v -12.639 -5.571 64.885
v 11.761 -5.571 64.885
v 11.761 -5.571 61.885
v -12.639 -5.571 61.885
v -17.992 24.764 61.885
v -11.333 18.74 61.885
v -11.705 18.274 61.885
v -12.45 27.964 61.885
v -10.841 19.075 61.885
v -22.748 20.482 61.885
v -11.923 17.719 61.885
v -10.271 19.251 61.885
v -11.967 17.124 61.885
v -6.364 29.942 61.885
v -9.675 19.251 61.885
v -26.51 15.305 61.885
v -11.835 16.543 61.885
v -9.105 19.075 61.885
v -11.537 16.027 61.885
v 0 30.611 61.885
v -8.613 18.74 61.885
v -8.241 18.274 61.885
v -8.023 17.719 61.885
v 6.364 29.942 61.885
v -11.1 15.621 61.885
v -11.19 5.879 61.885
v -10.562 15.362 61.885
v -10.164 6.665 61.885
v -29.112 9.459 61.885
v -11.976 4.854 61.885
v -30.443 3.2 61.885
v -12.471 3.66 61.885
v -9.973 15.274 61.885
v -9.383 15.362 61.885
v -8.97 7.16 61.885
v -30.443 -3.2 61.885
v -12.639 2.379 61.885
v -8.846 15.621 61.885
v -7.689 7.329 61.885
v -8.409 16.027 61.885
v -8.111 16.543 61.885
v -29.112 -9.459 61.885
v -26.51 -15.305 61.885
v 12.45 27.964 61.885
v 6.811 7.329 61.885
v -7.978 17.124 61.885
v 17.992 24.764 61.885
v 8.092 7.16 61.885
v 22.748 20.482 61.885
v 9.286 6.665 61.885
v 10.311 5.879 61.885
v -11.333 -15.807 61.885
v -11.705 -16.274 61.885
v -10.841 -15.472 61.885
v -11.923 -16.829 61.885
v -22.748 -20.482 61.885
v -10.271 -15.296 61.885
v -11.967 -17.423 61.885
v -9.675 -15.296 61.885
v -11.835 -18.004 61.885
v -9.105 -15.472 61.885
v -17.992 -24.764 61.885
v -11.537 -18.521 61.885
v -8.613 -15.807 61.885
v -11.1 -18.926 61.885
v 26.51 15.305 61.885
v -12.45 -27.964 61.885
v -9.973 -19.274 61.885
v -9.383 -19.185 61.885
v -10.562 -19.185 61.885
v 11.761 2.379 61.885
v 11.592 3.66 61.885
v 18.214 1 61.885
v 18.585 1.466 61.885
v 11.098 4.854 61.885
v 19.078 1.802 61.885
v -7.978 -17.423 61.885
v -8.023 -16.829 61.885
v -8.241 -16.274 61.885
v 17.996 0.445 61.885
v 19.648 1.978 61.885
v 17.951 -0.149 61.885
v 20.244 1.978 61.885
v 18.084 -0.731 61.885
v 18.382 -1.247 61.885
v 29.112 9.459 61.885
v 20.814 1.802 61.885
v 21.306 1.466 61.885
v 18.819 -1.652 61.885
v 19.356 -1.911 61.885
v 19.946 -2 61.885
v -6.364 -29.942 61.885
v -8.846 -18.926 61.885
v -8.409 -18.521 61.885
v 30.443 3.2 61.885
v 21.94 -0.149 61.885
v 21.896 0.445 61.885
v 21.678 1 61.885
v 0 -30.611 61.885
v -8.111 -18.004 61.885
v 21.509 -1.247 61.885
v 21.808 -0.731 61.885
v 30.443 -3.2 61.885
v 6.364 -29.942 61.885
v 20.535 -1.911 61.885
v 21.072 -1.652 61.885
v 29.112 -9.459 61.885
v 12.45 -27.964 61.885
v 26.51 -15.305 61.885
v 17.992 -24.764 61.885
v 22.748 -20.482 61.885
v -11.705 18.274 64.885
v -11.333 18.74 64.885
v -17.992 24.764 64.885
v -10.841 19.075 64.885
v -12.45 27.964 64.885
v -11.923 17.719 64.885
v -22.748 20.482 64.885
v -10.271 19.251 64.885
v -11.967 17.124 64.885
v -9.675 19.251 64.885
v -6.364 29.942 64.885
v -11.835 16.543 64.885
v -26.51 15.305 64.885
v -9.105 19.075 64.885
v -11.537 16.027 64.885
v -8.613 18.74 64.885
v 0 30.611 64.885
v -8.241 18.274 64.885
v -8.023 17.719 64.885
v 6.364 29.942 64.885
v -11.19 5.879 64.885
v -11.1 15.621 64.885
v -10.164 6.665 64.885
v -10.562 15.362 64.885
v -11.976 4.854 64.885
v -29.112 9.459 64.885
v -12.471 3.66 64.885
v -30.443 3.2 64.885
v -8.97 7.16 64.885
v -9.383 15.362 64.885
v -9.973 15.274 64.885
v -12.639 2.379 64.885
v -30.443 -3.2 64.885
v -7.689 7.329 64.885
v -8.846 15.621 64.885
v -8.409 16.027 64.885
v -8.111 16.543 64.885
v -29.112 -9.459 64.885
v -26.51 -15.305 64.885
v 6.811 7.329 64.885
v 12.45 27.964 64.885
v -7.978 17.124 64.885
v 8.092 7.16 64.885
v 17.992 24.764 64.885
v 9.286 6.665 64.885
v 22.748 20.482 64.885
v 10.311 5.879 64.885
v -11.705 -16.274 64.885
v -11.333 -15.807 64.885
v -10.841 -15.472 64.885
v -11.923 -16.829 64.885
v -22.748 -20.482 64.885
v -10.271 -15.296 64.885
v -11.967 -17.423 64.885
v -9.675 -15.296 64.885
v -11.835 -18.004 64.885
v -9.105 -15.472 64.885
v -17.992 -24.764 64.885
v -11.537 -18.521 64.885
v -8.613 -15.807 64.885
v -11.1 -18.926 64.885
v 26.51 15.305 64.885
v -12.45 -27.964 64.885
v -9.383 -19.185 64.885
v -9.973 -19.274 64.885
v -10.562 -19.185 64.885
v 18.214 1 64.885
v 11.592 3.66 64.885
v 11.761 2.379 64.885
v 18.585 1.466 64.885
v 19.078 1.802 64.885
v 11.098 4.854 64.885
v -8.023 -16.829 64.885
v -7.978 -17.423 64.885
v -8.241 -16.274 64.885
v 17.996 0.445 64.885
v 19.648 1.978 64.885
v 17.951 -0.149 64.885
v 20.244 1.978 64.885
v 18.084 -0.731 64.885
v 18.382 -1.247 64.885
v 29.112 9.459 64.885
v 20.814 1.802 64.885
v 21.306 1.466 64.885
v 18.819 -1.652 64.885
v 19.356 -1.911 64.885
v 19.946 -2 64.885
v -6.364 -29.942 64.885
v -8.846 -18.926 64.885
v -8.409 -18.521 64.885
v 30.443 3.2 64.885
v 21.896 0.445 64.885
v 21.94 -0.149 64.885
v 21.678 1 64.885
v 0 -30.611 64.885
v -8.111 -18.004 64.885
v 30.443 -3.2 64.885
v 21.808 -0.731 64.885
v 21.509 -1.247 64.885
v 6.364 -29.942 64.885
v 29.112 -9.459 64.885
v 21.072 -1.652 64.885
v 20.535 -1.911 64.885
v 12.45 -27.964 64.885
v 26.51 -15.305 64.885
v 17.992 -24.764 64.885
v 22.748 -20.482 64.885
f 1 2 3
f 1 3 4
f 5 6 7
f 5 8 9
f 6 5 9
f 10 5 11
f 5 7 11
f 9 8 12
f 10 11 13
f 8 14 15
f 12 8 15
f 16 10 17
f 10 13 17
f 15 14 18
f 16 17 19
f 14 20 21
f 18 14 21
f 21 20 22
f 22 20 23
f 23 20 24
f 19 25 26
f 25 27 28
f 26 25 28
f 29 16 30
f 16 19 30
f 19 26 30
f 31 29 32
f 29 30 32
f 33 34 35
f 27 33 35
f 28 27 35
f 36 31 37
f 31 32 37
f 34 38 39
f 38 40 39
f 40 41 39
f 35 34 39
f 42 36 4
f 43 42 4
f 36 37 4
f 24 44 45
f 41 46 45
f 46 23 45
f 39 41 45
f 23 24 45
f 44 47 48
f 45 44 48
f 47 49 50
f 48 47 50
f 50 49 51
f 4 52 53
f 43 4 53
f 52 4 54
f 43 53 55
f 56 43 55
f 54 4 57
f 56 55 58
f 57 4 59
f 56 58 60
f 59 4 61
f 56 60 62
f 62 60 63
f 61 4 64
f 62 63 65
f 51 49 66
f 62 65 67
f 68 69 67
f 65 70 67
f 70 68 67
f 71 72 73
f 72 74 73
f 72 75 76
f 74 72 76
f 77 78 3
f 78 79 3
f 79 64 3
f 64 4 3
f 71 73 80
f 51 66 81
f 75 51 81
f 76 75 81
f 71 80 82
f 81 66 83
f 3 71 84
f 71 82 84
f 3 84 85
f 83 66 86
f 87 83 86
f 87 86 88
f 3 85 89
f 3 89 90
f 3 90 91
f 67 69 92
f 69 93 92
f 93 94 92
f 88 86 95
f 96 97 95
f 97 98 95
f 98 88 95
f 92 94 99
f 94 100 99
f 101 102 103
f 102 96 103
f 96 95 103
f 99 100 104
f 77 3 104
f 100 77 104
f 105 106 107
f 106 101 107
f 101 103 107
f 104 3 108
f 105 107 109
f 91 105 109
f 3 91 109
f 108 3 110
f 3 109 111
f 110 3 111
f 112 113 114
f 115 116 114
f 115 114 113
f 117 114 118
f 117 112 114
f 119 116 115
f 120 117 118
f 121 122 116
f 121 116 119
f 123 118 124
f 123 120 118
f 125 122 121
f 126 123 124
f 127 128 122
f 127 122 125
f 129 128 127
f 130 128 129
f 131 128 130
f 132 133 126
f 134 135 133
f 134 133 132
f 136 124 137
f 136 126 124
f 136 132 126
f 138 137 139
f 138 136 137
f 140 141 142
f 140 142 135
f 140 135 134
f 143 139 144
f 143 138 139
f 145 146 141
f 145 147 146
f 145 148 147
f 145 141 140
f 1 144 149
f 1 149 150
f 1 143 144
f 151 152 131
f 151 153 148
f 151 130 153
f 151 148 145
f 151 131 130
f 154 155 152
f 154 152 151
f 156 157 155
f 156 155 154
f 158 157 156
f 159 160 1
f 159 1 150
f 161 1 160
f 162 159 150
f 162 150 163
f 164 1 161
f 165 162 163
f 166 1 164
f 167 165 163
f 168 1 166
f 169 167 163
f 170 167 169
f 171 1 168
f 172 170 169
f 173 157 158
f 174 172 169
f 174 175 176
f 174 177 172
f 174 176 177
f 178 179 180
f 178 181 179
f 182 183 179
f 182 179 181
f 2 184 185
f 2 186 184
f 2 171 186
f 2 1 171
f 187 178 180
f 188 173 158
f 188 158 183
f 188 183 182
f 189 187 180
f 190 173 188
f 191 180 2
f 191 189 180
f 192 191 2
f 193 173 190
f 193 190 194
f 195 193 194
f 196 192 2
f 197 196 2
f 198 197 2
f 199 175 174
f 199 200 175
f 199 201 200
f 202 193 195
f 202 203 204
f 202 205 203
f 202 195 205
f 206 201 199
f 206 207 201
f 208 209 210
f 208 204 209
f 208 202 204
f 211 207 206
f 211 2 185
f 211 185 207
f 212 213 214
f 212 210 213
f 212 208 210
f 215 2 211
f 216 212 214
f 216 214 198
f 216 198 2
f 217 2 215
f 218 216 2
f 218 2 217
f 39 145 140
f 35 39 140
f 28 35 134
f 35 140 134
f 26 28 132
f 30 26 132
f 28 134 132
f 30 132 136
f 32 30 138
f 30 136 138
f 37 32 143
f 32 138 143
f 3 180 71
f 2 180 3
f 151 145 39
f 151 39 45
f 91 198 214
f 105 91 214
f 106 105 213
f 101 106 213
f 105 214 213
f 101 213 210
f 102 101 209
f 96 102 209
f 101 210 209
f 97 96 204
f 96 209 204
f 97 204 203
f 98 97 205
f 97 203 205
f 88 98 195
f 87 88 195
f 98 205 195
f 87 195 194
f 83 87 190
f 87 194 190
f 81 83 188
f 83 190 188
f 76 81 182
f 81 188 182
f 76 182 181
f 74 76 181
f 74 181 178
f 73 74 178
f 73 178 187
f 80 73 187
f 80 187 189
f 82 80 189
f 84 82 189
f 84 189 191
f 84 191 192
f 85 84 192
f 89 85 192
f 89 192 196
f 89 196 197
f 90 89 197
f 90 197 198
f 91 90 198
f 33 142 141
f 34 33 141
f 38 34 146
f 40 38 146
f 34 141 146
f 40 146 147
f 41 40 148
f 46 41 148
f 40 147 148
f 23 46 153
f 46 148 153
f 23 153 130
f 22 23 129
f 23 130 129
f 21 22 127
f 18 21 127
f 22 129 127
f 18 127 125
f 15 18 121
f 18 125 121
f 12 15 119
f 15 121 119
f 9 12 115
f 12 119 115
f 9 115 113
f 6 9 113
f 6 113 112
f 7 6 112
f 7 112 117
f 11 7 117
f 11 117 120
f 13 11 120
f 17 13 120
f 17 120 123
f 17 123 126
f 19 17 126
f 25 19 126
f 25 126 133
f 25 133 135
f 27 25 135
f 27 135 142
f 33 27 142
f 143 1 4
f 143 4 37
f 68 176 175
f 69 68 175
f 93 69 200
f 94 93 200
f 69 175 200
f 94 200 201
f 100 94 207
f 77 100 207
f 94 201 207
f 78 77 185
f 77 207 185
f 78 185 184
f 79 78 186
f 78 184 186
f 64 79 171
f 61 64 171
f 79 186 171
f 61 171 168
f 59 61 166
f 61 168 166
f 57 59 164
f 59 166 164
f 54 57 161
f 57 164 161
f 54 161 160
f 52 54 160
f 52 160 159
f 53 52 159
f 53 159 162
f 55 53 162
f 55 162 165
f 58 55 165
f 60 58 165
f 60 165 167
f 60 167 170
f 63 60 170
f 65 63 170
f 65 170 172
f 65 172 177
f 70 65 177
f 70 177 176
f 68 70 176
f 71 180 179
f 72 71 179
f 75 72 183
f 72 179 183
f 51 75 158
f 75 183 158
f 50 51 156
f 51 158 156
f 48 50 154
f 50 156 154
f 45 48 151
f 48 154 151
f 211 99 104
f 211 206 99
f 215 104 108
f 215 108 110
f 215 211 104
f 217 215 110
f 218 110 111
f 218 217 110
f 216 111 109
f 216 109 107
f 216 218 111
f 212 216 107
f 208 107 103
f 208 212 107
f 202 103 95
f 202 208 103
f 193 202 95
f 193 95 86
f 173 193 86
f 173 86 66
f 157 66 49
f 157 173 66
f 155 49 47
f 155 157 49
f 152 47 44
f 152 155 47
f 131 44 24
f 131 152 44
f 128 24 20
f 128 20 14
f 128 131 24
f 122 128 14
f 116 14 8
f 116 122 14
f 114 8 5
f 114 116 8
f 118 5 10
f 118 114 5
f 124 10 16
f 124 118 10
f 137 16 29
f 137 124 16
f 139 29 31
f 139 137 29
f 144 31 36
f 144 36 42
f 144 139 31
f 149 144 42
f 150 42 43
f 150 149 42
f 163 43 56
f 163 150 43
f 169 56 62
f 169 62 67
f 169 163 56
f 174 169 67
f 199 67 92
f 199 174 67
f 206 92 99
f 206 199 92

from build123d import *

# Parameters (mm, degrees)
SKETCH021_W     = 30.610564
SKETCH021_H     = 3
POCKET_DEPTH    = 3.001
SKETCH023_R     = 2
POCKET001_DEPTH = 3.001


with BuildPart() as part:
    # Sketch021 → Revolution008 (revolve)
    with BuildSketch(Plane.YZ):
        with Locations((-15.305282, 63.385058)):
            Rectangle(SKETCH021_W, SKETCH021_H)
    revolve(axis=Axis((0, 0, 0), (0, 0, 1)))

    # Sketch022 (on Face1 of Revolution008) → Pocket (cut, through all)
    with BuildSketch(Plane(origin=(0, 0, 64.885058), x_dir=(0, -1, 0), z_dir=(0, 0, 1))):
        with BuildLine():
            Line((-2.378645, 11.760677), (5.571355, 11.760677))
            Line((5.571355, 11.760677), (5.571355, -12.639323))
            Line((5.571355, -12.639323), (-2.378645, -12.639323))
            ThreePointArc((-7.328645, -7.689323), (-5.878824, -11.189501), (-2.378645, -12.639323))
            Line((-7.328645, -7.689323), (-7.328645, 6.810677))
            ThreePointArc((-2.378645, 11.760677), (-5.878824, 10.310856), (-7.328645, 6.810677))
        make_face()
    extrude(amount=-POCKET_DEPTH, mode=Mode.SUBTRACT)

    # Sketch023 (on Face1 of Pocket) → Pocket001 (cut, through all)
    with BuildSketch(Plane(origin=(0, 0, 64.885058), x_dir=(0, -1, 0), z_dir=(0, 0, 1))):
        with Locations((-17.273551, -9.97289)):
            Circle(SKETCH023_R)
        with Locations((17.273551, -9.97289)):
            Circle(SKETCH023_R)
        with Locations((0, 19.945779)):
            Circle(SKETCH023_R)
    extrude(amount=-POCKET001_DEPTH, mode=Mode.SUBTRACT)


solid = part.part
